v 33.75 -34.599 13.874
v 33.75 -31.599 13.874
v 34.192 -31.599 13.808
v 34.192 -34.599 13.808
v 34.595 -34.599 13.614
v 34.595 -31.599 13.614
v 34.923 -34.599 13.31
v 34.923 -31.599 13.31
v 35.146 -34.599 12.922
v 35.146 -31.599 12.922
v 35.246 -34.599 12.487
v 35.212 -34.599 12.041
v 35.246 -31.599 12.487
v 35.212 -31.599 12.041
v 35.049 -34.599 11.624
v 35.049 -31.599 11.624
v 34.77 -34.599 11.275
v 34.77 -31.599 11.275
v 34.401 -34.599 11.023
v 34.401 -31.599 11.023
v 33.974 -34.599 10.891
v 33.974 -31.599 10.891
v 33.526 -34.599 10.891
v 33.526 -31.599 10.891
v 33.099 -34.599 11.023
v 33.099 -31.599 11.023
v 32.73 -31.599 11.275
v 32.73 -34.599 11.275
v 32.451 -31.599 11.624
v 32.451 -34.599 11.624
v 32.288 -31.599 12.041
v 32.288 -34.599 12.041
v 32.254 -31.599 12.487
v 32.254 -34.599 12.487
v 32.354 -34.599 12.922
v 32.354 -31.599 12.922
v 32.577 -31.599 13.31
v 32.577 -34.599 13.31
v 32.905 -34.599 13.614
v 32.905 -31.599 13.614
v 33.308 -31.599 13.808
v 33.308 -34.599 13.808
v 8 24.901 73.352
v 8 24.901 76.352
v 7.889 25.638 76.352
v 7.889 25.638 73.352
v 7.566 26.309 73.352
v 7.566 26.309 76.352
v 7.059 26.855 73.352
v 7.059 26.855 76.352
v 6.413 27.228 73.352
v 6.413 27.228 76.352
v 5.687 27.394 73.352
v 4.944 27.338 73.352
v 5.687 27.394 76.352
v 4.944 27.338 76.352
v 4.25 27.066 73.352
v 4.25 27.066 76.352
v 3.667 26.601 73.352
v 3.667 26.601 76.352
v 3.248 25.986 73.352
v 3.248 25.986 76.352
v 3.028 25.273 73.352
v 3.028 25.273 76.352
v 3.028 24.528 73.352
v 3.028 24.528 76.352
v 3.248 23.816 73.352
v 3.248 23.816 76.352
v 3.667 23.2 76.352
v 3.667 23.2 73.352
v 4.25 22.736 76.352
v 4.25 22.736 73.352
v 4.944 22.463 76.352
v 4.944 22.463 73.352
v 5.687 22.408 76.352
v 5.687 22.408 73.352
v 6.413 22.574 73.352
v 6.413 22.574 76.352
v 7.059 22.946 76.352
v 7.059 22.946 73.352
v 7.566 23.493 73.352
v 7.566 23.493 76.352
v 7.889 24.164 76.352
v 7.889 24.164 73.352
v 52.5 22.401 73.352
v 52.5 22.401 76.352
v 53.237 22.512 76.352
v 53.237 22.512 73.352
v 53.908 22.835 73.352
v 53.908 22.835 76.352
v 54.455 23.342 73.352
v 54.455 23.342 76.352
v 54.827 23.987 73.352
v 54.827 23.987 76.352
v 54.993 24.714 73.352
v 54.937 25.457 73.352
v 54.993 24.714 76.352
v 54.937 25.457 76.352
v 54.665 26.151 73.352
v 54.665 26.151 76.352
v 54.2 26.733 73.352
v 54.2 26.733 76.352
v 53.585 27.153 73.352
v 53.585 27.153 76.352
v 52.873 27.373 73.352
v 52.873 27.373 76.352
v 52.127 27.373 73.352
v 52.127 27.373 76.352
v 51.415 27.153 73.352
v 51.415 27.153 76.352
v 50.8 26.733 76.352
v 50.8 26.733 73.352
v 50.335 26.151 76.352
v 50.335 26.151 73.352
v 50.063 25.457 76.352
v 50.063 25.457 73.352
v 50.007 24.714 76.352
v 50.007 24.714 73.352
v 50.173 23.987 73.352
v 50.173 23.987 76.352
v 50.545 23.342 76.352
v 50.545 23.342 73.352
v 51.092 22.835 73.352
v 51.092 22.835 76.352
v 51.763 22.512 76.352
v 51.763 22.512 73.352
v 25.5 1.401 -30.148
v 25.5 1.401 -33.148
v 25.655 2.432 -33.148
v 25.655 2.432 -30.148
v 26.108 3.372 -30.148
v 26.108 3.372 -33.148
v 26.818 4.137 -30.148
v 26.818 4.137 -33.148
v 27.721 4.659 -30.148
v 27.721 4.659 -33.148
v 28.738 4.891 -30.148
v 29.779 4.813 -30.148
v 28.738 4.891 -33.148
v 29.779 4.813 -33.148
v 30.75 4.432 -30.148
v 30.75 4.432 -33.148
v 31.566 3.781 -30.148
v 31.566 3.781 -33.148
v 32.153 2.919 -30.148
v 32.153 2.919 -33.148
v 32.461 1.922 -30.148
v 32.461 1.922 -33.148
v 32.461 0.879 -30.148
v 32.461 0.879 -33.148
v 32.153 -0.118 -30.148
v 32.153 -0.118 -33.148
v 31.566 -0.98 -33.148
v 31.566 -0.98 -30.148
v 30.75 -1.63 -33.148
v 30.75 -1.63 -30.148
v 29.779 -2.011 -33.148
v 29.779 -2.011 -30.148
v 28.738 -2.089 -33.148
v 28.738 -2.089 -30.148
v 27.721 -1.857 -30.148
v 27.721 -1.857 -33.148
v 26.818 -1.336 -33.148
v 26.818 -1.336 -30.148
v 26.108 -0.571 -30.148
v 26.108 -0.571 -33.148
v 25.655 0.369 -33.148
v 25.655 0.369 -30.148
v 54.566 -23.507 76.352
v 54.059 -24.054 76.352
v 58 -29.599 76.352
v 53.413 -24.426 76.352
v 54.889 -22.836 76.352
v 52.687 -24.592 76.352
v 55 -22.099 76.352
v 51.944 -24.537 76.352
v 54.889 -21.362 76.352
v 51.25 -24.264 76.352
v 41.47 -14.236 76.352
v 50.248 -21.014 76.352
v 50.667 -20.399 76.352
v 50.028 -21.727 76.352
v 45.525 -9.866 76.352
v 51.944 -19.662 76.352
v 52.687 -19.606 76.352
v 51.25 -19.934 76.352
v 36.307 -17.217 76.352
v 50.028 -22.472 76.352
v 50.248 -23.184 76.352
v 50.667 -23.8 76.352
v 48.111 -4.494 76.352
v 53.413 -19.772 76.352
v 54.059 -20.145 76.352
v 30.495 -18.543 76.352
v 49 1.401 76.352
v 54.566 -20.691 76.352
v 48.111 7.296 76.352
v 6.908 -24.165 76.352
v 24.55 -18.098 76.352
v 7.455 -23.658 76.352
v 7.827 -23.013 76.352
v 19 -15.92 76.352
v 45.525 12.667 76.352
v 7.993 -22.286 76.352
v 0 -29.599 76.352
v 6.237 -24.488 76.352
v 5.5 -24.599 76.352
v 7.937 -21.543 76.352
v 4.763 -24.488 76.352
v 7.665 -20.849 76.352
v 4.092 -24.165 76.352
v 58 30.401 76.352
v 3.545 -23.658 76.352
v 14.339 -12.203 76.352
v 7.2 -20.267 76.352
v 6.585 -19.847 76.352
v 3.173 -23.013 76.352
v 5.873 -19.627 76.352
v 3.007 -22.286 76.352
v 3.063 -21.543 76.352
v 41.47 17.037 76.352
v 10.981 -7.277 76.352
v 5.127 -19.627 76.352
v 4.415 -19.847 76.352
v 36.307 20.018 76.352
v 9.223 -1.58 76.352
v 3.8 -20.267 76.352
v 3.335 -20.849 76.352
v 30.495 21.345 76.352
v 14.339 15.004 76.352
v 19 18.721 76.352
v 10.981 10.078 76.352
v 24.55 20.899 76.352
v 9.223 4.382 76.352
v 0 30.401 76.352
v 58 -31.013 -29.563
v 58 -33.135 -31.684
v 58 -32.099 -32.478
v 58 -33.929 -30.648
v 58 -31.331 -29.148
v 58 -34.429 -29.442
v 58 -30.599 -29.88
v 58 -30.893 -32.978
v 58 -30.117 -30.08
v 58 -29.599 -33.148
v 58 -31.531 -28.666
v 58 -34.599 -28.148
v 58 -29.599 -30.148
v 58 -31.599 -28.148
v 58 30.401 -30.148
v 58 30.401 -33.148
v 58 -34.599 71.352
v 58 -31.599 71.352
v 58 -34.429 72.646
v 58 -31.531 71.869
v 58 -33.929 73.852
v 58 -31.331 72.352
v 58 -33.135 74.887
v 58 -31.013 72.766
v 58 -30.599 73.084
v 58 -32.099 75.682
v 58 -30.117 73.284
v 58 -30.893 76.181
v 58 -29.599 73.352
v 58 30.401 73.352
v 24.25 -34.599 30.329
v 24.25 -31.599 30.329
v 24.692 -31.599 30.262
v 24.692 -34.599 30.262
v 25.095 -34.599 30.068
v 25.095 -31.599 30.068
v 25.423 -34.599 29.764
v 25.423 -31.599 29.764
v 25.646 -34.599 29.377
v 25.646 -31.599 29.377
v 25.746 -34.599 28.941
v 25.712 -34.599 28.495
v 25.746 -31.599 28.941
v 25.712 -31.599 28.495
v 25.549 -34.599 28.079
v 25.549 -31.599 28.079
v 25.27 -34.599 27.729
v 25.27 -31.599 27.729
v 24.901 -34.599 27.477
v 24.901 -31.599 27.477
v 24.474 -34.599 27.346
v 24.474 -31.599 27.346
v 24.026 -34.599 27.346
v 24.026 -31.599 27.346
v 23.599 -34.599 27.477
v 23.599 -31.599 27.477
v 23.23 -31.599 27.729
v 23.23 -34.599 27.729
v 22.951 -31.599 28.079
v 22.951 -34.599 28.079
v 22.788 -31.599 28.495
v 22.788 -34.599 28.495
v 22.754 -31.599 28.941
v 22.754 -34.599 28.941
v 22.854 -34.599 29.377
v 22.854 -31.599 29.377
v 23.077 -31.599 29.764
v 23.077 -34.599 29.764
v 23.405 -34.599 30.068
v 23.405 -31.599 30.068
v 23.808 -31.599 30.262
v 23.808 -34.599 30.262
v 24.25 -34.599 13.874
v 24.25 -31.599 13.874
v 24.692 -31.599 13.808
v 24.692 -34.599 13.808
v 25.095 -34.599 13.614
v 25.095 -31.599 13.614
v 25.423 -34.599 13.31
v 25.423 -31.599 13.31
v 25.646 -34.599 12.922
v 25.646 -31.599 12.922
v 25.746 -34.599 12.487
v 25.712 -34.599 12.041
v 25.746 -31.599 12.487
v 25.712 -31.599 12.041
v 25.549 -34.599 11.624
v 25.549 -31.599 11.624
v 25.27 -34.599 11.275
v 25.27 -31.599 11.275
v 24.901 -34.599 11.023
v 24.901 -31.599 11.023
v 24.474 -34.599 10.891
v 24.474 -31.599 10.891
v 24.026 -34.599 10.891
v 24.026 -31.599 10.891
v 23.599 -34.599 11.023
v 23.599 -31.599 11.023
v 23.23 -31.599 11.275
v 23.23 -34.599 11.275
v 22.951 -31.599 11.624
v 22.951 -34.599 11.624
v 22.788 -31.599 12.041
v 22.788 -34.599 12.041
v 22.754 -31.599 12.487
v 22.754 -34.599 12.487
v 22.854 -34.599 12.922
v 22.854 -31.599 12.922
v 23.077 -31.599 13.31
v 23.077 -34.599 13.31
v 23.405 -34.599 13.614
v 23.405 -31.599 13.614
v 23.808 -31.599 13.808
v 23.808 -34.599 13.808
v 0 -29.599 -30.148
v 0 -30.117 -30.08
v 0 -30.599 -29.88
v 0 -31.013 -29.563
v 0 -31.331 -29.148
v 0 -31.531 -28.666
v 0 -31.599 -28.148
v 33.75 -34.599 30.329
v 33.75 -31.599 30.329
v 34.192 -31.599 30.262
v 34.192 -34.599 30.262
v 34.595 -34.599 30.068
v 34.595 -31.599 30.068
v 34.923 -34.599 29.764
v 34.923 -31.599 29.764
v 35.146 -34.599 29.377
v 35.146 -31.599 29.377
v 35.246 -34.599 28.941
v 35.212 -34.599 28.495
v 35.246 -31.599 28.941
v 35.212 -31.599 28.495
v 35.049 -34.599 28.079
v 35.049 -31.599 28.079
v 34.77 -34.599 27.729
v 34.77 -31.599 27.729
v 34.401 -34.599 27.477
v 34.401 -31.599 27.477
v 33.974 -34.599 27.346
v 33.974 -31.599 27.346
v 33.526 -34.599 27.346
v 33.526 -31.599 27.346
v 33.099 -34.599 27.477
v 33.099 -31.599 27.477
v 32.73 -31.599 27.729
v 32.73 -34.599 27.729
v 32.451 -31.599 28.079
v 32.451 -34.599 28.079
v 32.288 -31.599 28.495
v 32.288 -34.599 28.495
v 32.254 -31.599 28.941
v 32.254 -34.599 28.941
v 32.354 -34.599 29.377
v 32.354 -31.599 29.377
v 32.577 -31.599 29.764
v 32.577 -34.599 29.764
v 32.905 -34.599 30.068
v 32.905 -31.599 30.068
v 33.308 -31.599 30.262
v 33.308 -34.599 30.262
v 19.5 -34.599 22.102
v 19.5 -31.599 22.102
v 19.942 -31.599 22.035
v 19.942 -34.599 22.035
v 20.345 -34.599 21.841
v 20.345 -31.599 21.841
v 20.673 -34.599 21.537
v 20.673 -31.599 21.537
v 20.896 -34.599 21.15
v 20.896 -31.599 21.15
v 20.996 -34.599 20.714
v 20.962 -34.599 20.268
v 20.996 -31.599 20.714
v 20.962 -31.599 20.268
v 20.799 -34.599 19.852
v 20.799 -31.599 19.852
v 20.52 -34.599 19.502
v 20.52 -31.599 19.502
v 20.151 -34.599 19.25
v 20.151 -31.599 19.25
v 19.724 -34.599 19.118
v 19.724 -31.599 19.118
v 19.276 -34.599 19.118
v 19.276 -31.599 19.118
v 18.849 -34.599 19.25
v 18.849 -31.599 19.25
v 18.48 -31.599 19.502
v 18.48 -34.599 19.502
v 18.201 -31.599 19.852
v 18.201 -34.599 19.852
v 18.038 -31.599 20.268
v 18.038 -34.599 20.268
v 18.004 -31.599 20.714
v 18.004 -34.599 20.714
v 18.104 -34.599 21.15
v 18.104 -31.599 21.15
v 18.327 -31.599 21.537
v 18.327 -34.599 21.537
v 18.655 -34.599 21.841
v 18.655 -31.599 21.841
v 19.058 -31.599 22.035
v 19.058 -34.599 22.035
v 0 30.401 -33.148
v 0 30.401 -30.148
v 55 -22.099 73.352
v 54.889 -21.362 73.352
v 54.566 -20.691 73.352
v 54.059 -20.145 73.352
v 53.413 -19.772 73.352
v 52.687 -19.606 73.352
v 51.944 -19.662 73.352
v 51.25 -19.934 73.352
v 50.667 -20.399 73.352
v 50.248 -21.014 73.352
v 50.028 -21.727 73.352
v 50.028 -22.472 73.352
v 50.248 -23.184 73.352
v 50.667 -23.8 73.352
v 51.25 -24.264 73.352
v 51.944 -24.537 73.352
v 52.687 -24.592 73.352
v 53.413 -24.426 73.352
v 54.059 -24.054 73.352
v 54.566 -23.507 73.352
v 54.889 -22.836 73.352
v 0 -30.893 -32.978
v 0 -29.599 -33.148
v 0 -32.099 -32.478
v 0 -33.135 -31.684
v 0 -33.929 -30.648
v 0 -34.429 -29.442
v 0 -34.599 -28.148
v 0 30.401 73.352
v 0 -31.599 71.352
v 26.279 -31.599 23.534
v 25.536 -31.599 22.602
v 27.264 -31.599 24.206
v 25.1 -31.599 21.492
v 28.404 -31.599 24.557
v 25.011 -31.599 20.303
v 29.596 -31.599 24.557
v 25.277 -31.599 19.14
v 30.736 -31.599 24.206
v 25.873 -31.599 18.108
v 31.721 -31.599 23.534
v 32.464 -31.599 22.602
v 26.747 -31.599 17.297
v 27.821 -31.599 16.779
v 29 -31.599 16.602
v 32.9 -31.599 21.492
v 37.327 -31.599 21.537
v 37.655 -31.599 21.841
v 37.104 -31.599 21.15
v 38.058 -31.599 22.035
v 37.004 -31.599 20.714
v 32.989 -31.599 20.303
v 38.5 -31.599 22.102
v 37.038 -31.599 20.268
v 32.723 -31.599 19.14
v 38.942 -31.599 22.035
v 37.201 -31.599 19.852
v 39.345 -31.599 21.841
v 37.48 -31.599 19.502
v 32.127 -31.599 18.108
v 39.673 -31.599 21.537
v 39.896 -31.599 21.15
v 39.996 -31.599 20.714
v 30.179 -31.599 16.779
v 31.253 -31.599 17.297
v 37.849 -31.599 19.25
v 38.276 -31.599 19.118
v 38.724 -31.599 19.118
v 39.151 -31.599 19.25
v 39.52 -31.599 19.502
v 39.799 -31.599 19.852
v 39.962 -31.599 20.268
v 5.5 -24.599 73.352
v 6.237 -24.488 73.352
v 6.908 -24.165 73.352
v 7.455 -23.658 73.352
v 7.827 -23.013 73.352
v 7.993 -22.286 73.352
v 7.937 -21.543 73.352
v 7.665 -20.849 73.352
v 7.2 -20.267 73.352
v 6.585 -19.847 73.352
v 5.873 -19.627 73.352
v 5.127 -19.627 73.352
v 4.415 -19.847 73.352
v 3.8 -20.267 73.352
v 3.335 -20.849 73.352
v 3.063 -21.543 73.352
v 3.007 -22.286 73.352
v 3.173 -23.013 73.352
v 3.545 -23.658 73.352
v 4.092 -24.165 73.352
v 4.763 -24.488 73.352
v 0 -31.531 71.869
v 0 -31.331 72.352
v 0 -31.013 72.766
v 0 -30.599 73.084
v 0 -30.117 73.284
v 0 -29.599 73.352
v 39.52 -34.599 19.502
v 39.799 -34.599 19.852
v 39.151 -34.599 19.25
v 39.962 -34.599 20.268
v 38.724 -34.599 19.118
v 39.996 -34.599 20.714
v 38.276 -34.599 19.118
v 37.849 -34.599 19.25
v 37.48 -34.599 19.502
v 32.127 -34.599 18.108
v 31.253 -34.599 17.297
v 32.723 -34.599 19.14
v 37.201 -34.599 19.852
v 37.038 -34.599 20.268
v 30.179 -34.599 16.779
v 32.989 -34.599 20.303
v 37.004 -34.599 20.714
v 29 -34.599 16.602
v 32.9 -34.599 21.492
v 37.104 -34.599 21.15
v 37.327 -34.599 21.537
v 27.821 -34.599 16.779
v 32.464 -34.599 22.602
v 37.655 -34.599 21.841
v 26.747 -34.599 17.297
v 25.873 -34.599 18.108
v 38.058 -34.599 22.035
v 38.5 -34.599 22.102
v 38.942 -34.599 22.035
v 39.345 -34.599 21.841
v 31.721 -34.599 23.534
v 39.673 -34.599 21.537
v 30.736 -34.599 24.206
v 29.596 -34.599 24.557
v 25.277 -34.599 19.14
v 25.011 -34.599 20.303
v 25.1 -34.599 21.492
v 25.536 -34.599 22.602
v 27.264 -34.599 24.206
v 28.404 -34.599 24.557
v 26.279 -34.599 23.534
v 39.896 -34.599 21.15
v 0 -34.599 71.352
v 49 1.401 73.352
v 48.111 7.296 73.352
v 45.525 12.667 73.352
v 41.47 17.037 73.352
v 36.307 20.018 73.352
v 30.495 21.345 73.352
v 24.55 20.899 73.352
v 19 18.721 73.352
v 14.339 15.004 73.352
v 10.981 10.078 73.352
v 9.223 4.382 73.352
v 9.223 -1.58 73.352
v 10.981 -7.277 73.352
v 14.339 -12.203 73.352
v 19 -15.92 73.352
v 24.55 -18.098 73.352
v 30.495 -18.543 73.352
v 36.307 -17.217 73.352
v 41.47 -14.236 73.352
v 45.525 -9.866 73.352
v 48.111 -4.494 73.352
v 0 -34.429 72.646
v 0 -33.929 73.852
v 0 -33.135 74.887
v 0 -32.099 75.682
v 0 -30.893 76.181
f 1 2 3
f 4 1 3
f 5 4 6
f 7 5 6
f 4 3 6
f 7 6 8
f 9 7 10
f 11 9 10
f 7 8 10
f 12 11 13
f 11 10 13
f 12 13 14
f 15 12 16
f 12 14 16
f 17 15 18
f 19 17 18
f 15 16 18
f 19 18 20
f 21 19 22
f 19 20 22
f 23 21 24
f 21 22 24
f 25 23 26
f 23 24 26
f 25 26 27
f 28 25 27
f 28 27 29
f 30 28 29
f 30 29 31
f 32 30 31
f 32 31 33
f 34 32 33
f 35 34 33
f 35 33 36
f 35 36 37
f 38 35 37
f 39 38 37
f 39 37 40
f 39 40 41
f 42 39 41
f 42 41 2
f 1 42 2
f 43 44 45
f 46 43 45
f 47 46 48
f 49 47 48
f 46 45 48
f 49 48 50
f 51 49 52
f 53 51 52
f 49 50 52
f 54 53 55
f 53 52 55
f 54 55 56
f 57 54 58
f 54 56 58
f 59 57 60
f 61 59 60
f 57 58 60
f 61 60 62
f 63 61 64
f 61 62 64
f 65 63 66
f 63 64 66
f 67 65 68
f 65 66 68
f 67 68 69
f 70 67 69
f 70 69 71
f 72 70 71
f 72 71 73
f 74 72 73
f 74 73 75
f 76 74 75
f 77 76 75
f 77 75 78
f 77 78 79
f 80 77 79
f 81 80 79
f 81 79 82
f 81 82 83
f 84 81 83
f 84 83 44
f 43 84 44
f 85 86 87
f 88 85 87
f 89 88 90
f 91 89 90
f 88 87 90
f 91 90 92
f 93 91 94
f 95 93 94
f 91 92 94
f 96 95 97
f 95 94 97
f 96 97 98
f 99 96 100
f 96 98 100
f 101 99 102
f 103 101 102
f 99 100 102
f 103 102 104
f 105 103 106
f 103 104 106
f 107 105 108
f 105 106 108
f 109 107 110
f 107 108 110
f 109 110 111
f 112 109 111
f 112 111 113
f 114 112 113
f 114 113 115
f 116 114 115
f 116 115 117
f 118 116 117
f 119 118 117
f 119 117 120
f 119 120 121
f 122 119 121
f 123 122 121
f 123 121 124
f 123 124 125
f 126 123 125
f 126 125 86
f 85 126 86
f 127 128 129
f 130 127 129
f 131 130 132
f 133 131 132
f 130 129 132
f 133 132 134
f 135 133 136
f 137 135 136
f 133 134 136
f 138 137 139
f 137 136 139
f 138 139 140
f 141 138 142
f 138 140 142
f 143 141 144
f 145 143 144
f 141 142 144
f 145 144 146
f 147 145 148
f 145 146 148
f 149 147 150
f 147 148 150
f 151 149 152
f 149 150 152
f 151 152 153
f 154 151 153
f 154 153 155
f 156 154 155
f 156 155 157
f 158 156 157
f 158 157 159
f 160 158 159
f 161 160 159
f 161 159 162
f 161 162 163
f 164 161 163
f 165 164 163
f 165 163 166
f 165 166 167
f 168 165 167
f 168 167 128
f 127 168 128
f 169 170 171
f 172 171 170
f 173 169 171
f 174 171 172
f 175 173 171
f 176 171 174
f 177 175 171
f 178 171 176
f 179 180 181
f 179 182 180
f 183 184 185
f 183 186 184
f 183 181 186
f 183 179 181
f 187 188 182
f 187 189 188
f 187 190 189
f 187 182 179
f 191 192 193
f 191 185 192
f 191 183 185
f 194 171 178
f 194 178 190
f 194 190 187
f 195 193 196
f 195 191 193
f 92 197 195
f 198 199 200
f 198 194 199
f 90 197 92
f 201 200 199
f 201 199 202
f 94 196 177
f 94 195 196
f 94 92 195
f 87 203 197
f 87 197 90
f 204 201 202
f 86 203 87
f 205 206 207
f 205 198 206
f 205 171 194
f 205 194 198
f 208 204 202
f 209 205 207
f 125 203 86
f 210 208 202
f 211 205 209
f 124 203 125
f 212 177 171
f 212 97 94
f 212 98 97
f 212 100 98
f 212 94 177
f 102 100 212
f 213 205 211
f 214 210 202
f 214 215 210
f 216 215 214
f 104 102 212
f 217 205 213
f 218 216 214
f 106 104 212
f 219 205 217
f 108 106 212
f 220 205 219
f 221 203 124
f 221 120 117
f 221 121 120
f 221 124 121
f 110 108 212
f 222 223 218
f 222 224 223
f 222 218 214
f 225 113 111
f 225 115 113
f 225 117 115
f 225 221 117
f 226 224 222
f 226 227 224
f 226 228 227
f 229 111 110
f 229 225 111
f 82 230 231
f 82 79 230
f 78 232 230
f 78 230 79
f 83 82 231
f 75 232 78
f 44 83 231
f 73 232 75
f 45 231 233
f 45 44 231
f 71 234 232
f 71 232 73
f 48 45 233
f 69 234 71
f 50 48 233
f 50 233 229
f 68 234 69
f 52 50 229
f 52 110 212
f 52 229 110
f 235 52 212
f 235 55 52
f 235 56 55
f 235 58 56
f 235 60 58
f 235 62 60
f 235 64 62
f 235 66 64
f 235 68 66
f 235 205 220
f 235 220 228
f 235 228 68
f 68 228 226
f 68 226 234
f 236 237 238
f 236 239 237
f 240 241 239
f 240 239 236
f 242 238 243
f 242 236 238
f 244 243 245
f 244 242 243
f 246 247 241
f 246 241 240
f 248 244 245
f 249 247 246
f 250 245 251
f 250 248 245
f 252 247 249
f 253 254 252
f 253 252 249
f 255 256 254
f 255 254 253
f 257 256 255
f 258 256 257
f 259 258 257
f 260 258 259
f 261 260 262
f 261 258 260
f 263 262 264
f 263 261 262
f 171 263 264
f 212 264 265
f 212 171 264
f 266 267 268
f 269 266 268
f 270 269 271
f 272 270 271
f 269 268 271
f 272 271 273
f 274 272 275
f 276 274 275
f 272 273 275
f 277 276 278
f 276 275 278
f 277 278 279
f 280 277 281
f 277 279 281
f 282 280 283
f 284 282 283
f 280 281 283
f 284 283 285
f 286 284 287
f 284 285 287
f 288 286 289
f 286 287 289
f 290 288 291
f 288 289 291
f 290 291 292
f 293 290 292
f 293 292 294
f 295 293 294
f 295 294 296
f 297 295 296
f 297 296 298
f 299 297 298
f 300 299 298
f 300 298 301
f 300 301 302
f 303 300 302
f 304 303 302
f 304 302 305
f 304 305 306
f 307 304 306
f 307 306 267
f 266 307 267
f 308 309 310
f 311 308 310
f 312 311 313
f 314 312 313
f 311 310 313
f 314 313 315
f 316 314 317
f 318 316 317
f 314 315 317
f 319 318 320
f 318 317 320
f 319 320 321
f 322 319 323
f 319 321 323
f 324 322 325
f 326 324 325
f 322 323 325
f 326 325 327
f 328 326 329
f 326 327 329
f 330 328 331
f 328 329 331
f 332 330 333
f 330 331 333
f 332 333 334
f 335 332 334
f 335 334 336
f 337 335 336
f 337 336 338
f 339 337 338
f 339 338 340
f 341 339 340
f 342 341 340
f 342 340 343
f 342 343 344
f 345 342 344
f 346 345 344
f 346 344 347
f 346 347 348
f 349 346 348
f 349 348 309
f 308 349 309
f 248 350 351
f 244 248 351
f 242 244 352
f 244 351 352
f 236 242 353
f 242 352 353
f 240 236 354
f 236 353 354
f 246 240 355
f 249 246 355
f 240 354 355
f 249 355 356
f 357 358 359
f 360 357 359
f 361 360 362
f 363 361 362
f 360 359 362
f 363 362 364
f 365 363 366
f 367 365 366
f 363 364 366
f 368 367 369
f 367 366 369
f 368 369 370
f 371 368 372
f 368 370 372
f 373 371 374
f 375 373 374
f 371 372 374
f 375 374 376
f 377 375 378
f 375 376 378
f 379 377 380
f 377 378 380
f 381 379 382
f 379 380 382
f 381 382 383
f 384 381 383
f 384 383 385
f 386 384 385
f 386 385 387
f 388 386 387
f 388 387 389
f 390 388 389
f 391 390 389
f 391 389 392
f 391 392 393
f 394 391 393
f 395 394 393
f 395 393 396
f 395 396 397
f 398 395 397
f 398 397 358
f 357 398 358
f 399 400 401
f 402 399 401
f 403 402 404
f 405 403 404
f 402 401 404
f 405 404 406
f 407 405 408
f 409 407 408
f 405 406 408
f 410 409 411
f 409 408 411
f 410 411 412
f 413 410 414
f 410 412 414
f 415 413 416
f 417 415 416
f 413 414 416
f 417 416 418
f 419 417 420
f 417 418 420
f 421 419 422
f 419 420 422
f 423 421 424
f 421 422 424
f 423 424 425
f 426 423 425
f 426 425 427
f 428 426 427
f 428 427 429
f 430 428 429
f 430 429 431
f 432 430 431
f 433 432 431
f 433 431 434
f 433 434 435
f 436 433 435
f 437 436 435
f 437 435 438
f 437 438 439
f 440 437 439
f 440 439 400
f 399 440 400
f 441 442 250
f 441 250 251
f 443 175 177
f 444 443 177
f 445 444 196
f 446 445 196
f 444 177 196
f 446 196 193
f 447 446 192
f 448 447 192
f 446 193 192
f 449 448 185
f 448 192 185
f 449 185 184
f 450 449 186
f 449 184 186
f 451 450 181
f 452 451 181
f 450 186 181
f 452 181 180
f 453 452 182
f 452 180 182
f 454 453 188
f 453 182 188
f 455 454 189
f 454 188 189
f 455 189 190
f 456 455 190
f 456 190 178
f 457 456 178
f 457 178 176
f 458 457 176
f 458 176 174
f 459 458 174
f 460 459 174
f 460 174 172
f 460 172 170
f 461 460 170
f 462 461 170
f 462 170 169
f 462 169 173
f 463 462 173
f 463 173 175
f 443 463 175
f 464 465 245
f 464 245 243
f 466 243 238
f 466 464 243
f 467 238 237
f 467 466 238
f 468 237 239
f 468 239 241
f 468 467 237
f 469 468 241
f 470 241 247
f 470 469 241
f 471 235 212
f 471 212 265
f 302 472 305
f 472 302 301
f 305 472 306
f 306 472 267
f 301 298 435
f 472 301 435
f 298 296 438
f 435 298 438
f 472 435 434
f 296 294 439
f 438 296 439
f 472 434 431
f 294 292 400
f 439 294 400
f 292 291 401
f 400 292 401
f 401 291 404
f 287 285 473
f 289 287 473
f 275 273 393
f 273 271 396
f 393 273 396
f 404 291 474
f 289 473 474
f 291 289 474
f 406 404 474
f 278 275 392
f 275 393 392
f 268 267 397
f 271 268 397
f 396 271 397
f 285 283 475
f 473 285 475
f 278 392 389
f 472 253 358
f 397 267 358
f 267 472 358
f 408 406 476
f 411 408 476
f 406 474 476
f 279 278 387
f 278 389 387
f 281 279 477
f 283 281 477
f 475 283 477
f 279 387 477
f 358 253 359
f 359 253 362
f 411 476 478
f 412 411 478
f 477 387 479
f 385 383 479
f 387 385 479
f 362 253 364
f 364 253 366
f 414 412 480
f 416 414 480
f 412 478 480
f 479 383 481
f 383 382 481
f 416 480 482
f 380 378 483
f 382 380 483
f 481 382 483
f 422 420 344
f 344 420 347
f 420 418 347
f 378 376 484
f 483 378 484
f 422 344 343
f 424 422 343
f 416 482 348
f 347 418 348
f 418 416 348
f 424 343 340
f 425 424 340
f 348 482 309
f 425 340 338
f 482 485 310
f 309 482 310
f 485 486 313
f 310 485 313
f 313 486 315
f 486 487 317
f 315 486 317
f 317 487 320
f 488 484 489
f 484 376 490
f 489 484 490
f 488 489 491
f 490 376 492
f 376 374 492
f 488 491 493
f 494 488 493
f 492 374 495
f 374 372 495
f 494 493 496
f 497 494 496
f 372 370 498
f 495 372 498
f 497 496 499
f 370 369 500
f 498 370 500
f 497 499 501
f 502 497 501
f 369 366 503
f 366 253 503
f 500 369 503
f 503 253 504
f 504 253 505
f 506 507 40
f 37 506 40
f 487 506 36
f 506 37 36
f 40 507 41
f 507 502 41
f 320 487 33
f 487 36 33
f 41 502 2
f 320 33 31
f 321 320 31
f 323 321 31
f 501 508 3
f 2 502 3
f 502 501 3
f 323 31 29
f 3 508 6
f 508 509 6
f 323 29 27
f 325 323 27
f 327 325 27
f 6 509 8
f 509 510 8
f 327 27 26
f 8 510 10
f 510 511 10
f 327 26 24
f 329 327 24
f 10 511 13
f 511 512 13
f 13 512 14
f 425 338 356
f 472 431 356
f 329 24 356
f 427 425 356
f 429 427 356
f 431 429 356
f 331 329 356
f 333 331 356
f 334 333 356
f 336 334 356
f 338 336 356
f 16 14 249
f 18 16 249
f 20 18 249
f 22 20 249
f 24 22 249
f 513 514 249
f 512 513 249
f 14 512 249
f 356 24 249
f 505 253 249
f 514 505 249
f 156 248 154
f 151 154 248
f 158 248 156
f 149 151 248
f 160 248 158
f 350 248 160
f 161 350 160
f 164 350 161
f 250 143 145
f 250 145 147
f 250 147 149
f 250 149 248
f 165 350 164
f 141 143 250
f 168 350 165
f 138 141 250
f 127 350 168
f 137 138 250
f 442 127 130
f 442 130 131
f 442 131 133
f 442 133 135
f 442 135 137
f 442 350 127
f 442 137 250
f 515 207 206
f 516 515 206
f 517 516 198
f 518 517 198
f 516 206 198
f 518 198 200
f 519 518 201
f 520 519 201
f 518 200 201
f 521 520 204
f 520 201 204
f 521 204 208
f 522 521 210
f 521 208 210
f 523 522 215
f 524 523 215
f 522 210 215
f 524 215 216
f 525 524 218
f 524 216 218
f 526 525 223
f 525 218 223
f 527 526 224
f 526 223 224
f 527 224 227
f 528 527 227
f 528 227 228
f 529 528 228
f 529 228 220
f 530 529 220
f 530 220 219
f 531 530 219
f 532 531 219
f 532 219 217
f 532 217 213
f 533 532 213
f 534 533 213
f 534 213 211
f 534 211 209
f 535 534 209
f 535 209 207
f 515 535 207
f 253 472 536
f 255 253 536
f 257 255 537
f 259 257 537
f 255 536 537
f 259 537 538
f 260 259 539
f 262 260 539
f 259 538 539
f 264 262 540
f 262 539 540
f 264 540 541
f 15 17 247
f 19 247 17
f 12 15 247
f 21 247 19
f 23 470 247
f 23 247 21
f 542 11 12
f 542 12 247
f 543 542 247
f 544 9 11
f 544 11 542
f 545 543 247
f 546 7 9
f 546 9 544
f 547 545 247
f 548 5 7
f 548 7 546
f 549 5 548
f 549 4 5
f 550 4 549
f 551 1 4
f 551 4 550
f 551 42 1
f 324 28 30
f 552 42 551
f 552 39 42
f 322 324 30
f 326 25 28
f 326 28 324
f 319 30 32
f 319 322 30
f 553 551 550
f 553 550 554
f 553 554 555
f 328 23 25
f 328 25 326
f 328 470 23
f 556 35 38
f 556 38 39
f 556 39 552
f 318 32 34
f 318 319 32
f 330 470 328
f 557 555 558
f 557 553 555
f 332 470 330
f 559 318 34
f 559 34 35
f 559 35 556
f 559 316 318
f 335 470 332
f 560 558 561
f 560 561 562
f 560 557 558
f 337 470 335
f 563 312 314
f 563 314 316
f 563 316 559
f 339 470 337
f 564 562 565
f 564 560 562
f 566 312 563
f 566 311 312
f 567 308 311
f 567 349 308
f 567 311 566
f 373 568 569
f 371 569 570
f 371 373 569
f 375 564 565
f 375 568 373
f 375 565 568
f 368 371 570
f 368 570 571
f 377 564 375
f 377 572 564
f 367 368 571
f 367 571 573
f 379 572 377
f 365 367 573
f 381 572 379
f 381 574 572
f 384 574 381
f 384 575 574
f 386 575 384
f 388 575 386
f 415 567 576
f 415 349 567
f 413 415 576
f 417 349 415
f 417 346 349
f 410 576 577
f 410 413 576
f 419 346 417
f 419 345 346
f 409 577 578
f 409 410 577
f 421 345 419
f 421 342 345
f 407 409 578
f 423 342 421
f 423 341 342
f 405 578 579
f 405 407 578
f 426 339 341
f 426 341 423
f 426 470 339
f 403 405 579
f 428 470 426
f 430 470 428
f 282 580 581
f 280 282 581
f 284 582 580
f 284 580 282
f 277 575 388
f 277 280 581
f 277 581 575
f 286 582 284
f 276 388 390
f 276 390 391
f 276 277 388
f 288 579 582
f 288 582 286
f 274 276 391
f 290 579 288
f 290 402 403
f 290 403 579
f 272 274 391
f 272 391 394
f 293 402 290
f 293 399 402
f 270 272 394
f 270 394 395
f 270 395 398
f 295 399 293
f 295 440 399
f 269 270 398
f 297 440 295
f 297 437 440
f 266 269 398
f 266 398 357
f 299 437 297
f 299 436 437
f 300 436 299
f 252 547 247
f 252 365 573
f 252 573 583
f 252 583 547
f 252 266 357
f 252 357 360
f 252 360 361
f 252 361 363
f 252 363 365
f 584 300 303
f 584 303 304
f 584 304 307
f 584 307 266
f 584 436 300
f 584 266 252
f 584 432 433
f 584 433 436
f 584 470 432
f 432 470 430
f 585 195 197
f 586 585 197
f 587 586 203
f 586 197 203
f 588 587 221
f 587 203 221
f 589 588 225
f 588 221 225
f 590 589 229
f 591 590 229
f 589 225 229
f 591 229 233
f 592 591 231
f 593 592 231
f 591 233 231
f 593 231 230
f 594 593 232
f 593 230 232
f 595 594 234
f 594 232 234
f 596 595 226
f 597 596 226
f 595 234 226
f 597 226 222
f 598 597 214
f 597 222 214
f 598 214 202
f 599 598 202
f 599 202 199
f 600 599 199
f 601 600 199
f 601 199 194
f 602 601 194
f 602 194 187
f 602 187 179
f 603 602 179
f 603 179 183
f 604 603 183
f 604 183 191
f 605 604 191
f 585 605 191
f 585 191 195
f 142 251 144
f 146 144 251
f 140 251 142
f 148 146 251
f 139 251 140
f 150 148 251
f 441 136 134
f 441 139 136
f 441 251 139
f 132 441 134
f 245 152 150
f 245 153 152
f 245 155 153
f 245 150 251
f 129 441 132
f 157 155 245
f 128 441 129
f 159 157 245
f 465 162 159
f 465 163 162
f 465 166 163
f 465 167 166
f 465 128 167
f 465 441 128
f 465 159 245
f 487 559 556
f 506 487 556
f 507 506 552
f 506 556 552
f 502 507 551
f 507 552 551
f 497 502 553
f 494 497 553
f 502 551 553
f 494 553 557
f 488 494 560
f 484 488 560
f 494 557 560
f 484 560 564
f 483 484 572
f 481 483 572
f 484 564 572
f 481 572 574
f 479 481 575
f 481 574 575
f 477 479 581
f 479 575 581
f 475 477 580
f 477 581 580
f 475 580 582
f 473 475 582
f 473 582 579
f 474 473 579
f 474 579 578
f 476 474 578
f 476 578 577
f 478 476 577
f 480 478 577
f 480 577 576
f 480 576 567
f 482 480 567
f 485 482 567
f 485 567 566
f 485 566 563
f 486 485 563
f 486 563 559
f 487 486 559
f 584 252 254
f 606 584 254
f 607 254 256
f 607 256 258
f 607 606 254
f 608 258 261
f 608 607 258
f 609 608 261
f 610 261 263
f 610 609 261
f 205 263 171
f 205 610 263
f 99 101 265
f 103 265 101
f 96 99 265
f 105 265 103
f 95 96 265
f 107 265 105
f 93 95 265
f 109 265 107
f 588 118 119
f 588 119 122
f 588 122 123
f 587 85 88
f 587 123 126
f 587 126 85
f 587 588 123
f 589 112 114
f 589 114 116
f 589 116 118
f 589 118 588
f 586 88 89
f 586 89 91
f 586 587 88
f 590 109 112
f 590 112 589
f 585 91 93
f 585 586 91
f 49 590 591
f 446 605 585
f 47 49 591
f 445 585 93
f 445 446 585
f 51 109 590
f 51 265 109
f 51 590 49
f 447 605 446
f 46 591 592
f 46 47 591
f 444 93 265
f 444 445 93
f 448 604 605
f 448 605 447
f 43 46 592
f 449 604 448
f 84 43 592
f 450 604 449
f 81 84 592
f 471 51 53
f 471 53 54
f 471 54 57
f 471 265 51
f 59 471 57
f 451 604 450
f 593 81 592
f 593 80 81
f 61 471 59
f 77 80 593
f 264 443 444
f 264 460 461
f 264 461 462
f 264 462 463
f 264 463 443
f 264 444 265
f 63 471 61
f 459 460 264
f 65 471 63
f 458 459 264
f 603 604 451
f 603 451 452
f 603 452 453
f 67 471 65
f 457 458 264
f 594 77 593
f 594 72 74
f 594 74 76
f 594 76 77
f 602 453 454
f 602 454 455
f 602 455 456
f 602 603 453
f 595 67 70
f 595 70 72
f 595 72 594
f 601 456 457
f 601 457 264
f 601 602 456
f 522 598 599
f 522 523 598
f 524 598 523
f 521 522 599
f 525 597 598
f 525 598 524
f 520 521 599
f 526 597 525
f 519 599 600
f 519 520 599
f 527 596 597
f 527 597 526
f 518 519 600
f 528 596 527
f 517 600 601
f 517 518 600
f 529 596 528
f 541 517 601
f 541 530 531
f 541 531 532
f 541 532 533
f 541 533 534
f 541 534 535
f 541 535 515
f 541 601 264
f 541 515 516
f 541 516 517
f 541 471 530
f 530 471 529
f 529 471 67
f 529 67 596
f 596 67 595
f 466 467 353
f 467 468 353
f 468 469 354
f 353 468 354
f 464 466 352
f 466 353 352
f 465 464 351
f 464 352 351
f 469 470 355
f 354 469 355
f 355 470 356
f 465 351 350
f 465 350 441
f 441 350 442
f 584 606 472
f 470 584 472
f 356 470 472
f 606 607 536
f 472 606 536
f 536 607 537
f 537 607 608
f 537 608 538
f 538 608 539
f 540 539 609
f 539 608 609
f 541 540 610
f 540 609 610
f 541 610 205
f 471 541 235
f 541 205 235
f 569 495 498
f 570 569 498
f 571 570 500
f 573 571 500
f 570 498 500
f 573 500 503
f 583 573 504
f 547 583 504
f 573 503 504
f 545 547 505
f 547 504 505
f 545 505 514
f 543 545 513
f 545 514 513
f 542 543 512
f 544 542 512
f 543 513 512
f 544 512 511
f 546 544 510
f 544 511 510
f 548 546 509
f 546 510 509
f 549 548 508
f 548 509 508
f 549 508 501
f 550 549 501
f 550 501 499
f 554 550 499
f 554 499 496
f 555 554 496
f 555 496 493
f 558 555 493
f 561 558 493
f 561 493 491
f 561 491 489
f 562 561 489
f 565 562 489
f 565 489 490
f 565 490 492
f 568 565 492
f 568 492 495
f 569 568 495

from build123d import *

# Parameters (mm, degrees)
BOSS_EXTRUDE1_DEPTH    = 58
SKETCH25_R             = 4
CUT_EXTRUDE6_DEPTH     = 10
SKETCH26_W             = 103.5
SKETCH26_H             = 2
CUT_EXTRUDE7_DEPTH     = 90
SKETCH29_R             = 1.5
CUT_EXTRUDE8_DEPTH     = 10
CONVERT_SOLID1_DEPTH   = 58
CONVERT_SOLID1_2_DEPTH = 58
SKETCH2_R              = 2.5
SKETCH2_R_2            = 20
CUT_EXTRUDE10_DEPTH    = 10
SKETCH30_R             = 3.5
CUT_EXTRUDE11_DEPTH    = 10


# Read off the part's stored shape, not the designer's step: Convert-Solid1
with BuildPart() as part:
    # Sketch1 → Boss-Extrude1 (new body)
    with BuildSketch(Plane(origin=(0, 0, 0), x_dir=(0, 0, -1), z_dir=(1, 0, 0))):
        Polygon((-73.351671883, 30.400809615), (-73.351671883, -29.599190385), (30.148328117, -29.599190385), (30.148328117, 30.400809615), (33.148328117, 30.400809615), (33.148328117, -34.599190385), (-76.351671883, -34.599190385), (-76.351671883, 30.400809615), align=None)
    extrude(amount=BOSS_EXTRUDE1_DEPTH)

    # Sketch25 → Cut-Extrude6 (cut)
    with BuildSketch(Plane.XZ.offset(34.599190385)):
        with Locations(Location((29, 20.601671883, 0), (0, 0, 270))):
            Circle(SKETCH25_R)
    extrude(amount=-CUT_EXTRUDE6_DEPTH, mode=Mode.SUBTRACT)

    # Sketch26 → Cut-Extrude7 (cut)
    with BuildSketch(Plane(origin=(58, 0, 0), x_dir=(0, 0, -1), z_dir=(1, 0, 0))):
        with Locations((-21.601671883, -30.599190385)):
            Rectangle(SKETCH26_W, SKETCH26_H)
    extrude(amount=-CUT_EXTRUDE7_DEPTH, mode=Mode.SUBTRACT)

    # Sketch29 → Cut-Extrude8 (cut)
    with BuildSketch(Plane(origin=(0, -31.599190385, 0), x_dir=(1, 0, 0), z_dir=(0, 1, 0))):
        with Locations(Location((19.5, -20.601671883, 0), (0, 0, 270))):
            Circle(SKETCH29_R)
        with Locations(Location((24.25, -12.374430547, 0), (0, 0, 270))):
            Circle(SKETCH29_R)
        with Locations(Location((33.75, -12.374430547, 0), (0, 0, 270))):
            Circle(SKETCH29_R)
        with Locations(Location((38.5, -20.601671883, 0), (0, 0, 270))):
            Circle(SKETCH29_R)
        with Locations(Location((33.75, -28.828913219, 0), (0, 0, 270))):
            Circle(SKETCH29_R)
        with Locations(Location((24.25, -28.828913219, 0), (0, 0, 270))):
            Circle(SKETCH29_R)
    extrude(amount=-CUT_EXTRUDE8_DEPTH, mode=Mode.SUBTRACT)

    # Convert-Solid1 outline → Convert-Solid1 (cut)
    with BuildSketch(Plane.YZ):
        with BuildLine():
            Line((-34.599190385, -33.148328117), (-29.599190385, -33.148328117))
            ThreePointArc((-29.599190385, -33.148328117), (-33.134724291, -31.683862023), (-34.599190385, -28.148328117))
            Line((-34.599190385, -28.148328117), (-34.599190385, -33.148328117))
        make_face()
        with BuildLine():
            Line((-34.599190385, 76.351671883), (-34.599190385, 71.351671883))
            ThreePointArc((-34.599190385, 71.351671883), (-33.134724291, 74.887205789), (-29.599190385, 76.351671883))
            Line((-29.599190385, 76.351671883), (-34.599190385, 76.351671883))
        make_face()
    extrude(amount=CONVERT_SOLID1_DEPTH, mode=Mode.SUBTRACT)

    # Convert-Solid1 2 outline → Convert-Solid1 2 (add)
    with BuildSketch(Plane.YZ):
        with BuildLine():
            Line((-31.599190385, -30.148328117), (-29.599190385, -30.148328117))
            ThreePointArc((-29.599190385, -30.148328117), (-31.013403947, -29.56254168), (-31.599190385, -28.148328117))
            Line((-31.599190385, -28.148328117), (-31.599190385, -30.148328117))
        make_face()
        with BuildLine():
            Line((-31.599190385, 73.351671883), (-31.599190385, 71.351671883))
            ThreePointArc((-31.599190385, 71.351671883), (-31.013403947, 72.765885445), (-29.599190385, 73.351671883))
            Line((-29.599190385, 73.351671883), (-31.599190385, 73.351671883))
        make_face()
    extrude(amount=CONVERT_SOLID1_2_DEPTH)

    # Sketch2 → Cut-Extrude10 (cut)
    with BuildSketch(Plane.XY.offset(76.351671883)):
        with Locations((5.5, 24.900809615)):
            Circle(SKETCH2_R)
        with Locations(Location((52.5, 24.900809615, 0), (0, 0, 270))):
            Circle(SKETCH2_R)
        with Locations((52.5, -22.099190385)):
            Circle(SKETCH2_R)
        with Locations(Location((5.5, -22.099190385, 0), (0, 0, 270))):
            Circle(SKETCH2_R)
        with Locations((29, 1.400809615)):
            Circle(SKETCH2_R_2)
    extrude(amount=-CUT_EXTRUDE10_DEPTH, mode=Mode.SUBTRACT)

    # Sketch30 → Cut-Extrude11 (cut)
    with BuildSketch(Plane(origin=(0, 0, -33.148328117), x_dir=(-1, 0, 0), z_dir=(0, 0, -1))):
        with Locations((-29, 1.400809615)):
            Circle(SKETCH30_R)
    extrude(amount=-CUT_EXTRUDE11_DEPTH, mode=Mode.SUBTRACT)


solid = part.part
